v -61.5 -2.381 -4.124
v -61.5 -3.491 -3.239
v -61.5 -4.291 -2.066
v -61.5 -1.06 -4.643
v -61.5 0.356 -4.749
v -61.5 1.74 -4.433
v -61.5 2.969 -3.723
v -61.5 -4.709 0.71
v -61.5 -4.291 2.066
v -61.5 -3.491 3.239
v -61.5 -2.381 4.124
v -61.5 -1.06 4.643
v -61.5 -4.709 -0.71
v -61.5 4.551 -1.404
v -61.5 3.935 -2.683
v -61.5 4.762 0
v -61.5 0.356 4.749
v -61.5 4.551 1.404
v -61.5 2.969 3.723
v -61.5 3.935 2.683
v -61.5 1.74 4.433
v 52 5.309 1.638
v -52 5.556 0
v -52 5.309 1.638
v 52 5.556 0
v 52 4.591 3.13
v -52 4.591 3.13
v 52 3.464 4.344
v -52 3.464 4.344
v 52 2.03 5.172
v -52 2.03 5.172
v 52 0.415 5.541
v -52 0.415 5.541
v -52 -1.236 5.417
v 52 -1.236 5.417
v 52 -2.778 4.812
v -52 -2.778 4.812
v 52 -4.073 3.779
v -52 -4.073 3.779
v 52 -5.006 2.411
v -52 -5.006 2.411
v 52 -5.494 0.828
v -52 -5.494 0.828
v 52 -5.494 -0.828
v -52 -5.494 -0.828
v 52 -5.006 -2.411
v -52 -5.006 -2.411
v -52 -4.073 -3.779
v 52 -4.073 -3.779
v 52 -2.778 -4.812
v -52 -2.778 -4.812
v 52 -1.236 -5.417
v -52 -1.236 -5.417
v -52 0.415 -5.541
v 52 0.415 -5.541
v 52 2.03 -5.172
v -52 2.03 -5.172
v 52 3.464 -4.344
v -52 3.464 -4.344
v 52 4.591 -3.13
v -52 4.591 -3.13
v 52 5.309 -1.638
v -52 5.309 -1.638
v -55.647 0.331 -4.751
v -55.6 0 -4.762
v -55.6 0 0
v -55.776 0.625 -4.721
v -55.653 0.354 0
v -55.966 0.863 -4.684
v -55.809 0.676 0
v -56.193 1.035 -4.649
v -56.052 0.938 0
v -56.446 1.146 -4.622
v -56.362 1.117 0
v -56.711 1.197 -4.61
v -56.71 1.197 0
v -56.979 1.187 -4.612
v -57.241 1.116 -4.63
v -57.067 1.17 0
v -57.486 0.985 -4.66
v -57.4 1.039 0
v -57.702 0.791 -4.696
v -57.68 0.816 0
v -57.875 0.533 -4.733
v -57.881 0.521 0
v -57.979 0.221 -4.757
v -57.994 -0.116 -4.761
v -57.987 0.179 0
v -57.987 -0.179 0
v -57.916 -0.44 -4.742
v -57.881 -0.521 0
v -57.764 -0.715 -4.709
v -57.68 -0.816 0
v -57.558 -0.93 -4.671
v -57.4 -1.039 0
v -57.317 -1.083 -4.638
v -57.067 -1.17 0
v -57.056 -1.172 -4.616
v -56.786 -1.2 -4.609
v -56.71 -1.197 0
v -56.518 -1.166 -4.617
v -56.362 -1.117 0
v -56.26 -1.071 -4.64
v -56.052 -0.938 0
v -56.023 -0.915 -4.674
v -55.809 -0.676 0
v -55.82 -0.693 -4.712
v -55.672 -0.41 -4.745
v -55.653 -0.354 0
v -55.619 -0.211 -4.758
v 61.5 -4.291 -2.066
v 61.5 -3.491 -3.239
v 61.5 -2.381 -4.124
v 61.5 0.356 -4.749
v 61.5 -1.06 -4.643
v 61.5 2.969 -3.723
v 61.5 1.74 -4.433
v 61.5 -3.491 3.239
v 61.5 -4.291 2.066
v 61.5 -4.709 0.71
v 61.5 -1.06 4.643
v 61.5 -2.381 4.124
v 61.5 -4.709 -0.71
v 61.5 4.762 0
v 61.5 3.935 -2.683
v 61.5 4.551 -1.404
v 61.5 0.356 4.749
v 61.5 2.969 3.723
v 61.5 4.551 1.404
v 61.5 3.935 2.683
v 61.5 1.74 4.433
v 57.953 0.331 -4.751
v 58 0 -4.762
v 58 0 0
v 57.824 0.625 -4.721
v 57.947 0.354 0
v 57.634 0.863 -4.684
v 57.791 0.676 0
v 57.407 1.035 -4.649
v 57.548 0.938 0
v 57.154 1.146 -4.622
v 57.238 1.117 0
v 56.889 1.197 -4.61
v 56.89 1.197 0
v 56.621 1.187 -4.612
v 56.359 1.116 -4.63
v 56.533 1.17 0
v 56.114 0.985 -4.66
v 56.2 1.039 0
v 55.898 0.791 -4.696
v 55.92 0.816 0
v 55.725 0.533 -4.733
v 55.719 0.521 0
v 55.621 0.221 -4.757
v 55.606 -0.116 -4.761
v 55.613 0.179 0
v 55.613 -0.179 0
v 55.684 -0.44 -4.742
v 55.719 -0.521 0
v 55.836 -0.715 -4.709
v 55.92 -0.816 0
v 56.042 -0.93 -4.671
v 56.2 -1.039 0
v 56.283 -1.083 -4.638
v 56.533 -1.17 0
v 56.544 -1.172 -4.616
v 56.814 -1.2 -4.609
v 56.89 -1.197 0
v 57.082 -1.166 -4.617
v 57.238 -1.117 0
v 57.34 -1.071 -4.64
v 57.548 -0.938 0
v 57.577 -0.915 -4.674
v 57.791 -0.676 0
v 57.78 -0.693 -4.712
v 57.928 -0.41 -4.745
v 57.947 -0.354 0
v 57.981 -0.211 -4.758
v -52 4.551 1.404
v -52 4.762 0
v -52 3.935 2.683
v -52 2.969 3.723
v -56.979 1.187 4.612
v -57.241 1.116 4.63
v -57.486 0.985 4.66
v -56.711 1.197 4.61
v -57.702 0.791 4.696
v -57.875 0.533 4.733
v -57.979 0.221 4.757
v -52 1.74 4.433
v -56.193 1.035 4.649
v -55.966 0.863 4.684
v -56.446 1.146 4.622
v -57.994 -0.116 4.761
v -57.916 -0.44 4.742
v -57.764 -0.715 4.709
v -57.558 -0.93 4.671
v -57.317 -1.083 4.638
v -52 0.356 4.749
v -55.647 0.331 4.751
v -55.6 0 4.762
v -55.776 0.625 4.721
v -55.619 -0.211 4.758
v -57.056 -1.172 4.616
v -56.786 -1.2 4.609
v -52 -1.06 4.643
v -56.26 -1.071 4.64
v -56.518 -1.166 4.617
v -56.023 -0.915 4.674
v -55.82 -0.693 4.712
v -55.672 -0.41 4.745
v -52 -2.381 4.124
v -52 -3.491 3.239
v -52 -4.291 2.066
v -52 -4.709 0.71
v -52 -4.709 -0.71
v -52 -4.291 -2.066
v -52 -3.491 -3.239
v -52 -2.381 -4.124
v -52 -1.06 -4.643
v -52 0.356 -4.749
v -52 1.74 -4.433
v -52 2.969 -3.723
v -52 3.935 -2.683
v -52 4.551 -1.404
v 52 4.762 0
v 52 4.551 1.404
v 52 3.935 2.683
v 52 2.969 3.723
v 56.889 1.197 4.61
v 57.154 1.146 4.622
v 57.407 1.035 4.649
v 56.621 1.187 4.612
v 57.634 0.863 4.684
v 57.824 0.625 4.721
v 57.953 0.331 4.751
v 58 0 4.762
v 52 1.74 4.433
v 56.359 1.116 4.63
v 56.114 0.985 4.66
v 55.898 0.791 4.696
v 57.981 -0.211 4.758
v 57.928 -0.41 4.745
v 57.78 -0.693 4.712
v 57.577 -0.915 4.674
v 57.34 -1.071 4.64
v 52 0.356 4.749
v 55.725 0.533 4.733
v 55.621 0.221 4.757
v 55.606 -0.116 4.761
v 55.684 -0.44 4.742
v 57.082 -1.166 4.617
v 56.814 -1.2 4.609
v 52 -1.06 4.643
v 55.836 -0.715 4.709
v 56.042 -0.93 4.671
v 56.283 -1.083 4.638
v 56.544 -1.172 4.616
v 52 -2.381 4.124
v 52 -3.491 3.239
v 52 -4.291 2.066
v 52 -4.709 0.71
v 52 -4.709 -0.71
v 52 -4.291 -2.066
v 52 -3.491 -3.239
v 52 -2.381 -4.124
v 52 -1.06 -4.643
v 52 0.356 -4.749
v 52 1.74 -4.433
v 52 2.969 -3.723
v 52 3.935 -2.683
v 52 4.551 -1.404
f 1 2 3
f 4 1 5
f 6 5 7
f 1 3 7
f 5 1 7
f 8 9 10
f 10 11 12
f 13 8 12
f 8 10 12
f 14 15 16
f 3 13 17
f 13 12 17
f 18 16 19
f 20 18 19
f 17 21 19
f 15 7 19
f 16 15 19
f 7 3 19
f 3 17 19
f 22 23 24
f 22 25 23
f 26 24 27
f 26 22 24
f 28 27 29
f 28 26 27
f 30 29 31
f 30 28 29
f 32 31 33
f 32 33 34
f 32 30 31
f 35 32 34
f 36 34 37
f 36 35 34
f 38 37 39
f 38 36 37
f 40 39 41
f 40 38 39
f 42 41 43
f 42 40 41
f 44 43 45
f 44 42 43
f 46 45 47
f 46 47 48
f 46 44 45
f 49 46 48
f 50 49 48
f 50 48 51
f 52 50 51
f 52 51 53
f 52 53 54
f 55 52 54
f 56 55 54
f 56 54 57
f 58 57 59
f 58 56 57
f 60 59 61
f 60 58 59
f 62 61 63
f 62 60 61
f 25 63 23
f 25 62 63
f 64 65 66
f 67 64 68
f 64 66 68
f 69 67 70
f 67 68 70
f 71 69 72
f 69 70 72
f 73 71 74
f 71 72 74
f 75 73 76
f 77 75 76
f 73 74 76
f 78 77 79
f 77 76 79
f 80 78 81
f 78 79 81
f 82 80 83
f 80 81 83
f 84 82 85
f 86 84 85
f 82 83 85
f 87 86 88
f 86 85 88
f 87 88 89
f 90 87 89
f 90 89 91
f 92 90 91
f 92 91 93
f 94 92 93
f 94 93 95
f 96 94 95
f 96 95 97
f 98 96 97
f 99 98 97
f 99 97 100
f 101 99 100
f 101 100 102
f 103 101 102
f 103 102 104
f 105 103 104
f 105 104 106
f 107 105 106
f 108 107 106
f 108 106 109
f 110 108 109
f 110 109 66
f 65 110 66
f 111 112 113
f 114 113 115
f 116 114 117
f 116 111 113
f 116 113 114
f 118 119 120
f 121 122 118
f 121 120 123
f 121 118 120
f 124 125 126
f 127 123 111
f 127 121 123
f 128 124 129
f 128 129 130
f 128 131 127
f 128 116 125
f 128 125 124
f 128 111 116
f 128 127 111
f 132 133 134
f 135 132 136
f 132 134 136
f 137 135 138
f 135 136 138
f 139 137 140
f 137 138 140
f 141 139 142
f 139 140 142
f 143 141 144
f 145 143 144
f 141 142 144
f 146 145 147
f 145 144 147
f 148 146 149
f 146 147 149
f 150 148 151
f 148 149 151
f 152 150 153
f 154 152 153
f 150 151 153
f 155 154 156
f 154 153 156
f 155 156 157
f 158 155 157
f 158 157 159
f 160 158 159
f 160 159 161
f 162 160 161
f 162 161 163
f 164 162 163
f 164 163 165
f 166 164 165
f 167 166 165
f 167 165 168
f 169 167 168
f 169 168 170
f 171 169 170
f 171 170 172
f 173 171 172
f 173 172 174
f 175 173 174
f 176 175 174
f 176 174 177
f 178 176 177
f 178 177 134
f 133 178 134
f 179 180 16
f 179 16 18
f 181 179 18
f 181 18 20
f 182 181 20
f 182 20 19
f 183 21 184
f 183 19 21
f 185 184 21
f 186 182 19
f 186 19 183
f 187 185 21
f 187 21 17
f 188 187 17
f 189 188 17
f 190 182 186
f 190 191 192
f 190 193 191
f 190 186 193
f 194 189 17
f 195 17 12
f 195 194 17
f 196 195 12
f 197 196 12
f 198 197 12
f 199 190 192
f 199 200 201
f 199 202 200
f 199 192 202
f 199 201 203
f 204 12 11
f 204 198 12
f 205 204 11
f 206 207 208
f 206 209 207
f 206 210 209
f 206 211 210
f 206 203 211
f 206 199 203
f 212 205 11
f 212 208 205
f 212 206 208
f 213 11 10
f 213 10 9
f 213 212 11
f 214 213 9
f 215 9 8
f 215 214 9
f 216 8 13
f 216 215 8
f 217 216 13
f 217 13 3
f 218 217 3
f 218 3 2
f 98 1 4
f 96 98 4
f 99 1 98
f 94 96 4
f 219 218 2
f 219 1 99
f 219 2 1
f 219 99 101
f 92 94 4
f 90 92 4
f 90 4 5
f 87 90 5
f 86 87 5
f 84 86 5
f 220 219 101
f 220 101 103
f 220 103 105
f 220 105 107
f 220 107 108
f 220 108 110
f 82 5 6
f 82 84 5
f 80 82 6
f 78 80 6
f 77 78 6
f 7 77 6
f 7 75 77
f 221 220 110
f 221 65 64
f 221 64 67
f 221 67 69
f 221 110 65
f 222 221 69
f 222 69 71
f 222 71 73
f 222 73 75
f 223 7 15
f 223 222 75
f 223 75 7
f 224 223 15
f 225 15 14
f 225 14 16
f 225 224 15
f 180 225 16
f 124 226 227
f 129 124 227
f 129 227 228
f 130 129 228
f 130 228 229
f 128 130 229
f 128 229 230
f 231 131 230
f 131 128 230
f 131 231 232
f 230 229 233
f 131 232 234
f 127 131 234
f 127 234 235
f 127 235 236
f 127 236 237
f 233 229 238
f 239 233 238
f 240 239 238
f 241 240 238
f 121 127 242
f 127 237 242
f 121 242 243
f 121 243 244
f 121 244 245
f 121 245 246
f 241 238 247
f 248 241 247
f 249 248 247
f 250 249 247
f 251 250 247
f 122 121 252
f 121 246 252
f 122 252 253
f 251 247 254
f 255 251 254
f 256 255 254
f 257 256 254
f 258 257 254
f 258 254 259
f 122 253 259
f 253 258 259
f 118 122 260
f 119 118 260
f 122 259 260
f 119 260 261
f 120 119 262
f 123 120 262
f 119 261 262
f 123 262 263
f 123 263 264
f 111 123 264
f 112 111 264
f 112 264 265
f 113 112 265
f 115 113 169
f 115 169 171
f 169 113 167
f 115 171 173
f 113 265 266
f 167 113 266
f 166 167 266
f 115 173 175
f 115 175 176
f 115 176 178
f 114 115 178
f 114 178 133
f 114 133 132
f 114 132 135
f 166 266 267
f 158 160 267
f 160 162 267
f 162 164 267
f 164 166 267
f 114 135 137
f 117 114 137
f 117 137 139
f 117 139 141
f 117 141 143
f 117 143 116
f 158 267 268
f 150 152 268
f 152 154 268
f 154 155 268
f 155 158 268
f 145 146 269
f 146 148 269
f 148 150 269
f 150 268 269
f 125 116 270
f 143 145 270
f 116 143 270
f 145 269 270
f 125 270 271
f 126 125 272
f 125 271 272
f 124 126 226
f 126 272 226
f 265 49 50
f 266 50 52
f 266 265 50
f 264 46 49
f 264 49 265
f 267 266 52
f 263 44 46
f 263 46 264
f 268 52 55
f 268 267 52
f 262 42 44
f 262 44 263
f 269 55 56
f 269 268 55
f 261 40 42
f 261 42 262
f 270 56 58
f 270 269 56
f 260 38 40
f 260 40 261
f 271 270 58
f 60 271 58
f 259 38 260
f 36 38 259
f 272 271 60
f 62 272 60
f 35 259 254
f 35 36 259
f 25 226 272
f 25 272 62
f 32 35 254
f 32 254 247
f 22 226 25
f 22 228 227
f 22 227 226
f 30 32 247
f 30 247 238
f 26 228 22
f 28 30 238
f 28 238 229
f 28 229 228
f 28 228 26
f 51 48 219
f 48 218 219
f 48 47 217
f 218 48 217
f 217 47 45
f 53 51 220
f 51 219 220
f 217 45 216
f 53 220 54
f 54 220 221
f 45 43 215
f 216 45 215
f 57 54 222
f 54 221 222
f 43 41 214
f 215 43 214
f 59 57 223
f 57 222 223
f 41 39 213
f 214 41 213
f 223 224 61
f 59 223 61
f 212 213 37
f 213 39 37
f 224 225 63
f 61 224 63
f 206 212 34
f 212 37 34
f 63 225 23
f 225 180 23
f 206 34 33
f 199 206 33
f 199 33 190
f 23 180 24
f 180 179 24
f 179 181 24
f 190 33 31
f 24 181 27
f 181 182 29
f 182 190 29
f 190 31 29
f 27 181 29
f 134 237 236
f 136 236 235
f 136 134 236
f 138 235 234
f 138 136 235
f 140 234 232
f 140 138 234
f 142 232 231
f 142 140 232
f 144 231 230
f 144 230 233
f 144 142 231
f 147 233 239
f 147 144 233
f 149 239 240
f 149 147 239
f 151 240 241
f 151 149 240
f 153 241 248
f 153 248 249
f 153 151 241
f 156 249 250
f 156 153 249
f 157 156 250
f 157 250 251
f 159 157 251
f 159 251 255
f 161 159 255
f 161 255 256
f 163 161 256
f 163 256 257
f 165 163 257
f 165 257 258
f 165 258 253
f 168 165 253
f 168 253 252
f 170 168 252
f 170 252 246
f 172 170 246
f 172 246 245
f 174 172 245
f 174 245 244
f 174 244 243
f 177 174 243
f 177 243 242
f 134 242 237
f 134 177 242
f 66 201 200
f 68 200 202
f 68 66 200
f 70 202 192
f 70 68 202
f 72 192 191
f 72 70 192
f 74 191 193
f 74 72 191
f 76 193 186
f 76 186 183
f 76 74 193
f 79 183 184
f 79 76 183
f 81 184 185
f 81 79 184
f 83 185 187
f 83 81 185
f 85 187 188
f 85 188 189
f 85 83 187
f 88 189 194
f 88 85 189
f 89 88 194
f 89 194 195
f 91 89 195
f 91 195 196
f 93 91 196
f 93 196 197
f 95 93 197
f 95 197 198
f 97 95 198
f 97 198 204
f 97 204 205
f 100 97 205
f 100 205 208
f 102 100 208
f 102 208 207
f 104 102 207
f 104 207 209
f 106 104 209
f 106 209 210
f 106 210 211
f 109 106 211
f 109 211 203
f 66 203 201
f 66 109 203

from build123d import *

# Parameters (mm, degrees)
F0_R          = 5.55625
F1_DEPTH      = 52
F1_DEPTH_BACK = 52
F2_R          = 4.7625
F3_DEPTH      = 61.5
F3_DEPTH_BACK = 61.5
F4_R          = 1.2
F5_DEPTH      = 5.55725
F5_DEPTH_BACK = 5.55725


with BuildPart() as f1:
    # F0 (on Right) → F1 (new body, two sides)
    with BuildSketch(Plane.YZ) as f1_sk:
        Circle(F0_R)
    extrude(amount=F1_DEPTH)
    extrude(f1_sk.sketch, amount=-F1_DEPTH_BACK)

    # F2 (on Right) → F3 (join, two sides)
    with BuildSketch(Plane.YZ) as f3_sk:
        Circle(F2_R)
    extrude(amount=F3_DEPTH)
    extrude(f3_sk.sketch, amount=-F3_DEPTH_BACK)

    # F4 (on Top) → F5 (cut, two sides)
    with BuildSketch(Plane.XY) as f5_sk:
        with Locations((-56.8, 0)):
            Circle(F4_R)
        with Locations((56.8, 0)):
            Circle(F4_R)
    extrude(amount=-F5_DEPTH, mode=Mode.SUBTRACT)
    extrude(f5_sk.sketch, amount=F5_DEPTH_BACK, mode=Mode.SUBTRACT)


solid = f1.part
